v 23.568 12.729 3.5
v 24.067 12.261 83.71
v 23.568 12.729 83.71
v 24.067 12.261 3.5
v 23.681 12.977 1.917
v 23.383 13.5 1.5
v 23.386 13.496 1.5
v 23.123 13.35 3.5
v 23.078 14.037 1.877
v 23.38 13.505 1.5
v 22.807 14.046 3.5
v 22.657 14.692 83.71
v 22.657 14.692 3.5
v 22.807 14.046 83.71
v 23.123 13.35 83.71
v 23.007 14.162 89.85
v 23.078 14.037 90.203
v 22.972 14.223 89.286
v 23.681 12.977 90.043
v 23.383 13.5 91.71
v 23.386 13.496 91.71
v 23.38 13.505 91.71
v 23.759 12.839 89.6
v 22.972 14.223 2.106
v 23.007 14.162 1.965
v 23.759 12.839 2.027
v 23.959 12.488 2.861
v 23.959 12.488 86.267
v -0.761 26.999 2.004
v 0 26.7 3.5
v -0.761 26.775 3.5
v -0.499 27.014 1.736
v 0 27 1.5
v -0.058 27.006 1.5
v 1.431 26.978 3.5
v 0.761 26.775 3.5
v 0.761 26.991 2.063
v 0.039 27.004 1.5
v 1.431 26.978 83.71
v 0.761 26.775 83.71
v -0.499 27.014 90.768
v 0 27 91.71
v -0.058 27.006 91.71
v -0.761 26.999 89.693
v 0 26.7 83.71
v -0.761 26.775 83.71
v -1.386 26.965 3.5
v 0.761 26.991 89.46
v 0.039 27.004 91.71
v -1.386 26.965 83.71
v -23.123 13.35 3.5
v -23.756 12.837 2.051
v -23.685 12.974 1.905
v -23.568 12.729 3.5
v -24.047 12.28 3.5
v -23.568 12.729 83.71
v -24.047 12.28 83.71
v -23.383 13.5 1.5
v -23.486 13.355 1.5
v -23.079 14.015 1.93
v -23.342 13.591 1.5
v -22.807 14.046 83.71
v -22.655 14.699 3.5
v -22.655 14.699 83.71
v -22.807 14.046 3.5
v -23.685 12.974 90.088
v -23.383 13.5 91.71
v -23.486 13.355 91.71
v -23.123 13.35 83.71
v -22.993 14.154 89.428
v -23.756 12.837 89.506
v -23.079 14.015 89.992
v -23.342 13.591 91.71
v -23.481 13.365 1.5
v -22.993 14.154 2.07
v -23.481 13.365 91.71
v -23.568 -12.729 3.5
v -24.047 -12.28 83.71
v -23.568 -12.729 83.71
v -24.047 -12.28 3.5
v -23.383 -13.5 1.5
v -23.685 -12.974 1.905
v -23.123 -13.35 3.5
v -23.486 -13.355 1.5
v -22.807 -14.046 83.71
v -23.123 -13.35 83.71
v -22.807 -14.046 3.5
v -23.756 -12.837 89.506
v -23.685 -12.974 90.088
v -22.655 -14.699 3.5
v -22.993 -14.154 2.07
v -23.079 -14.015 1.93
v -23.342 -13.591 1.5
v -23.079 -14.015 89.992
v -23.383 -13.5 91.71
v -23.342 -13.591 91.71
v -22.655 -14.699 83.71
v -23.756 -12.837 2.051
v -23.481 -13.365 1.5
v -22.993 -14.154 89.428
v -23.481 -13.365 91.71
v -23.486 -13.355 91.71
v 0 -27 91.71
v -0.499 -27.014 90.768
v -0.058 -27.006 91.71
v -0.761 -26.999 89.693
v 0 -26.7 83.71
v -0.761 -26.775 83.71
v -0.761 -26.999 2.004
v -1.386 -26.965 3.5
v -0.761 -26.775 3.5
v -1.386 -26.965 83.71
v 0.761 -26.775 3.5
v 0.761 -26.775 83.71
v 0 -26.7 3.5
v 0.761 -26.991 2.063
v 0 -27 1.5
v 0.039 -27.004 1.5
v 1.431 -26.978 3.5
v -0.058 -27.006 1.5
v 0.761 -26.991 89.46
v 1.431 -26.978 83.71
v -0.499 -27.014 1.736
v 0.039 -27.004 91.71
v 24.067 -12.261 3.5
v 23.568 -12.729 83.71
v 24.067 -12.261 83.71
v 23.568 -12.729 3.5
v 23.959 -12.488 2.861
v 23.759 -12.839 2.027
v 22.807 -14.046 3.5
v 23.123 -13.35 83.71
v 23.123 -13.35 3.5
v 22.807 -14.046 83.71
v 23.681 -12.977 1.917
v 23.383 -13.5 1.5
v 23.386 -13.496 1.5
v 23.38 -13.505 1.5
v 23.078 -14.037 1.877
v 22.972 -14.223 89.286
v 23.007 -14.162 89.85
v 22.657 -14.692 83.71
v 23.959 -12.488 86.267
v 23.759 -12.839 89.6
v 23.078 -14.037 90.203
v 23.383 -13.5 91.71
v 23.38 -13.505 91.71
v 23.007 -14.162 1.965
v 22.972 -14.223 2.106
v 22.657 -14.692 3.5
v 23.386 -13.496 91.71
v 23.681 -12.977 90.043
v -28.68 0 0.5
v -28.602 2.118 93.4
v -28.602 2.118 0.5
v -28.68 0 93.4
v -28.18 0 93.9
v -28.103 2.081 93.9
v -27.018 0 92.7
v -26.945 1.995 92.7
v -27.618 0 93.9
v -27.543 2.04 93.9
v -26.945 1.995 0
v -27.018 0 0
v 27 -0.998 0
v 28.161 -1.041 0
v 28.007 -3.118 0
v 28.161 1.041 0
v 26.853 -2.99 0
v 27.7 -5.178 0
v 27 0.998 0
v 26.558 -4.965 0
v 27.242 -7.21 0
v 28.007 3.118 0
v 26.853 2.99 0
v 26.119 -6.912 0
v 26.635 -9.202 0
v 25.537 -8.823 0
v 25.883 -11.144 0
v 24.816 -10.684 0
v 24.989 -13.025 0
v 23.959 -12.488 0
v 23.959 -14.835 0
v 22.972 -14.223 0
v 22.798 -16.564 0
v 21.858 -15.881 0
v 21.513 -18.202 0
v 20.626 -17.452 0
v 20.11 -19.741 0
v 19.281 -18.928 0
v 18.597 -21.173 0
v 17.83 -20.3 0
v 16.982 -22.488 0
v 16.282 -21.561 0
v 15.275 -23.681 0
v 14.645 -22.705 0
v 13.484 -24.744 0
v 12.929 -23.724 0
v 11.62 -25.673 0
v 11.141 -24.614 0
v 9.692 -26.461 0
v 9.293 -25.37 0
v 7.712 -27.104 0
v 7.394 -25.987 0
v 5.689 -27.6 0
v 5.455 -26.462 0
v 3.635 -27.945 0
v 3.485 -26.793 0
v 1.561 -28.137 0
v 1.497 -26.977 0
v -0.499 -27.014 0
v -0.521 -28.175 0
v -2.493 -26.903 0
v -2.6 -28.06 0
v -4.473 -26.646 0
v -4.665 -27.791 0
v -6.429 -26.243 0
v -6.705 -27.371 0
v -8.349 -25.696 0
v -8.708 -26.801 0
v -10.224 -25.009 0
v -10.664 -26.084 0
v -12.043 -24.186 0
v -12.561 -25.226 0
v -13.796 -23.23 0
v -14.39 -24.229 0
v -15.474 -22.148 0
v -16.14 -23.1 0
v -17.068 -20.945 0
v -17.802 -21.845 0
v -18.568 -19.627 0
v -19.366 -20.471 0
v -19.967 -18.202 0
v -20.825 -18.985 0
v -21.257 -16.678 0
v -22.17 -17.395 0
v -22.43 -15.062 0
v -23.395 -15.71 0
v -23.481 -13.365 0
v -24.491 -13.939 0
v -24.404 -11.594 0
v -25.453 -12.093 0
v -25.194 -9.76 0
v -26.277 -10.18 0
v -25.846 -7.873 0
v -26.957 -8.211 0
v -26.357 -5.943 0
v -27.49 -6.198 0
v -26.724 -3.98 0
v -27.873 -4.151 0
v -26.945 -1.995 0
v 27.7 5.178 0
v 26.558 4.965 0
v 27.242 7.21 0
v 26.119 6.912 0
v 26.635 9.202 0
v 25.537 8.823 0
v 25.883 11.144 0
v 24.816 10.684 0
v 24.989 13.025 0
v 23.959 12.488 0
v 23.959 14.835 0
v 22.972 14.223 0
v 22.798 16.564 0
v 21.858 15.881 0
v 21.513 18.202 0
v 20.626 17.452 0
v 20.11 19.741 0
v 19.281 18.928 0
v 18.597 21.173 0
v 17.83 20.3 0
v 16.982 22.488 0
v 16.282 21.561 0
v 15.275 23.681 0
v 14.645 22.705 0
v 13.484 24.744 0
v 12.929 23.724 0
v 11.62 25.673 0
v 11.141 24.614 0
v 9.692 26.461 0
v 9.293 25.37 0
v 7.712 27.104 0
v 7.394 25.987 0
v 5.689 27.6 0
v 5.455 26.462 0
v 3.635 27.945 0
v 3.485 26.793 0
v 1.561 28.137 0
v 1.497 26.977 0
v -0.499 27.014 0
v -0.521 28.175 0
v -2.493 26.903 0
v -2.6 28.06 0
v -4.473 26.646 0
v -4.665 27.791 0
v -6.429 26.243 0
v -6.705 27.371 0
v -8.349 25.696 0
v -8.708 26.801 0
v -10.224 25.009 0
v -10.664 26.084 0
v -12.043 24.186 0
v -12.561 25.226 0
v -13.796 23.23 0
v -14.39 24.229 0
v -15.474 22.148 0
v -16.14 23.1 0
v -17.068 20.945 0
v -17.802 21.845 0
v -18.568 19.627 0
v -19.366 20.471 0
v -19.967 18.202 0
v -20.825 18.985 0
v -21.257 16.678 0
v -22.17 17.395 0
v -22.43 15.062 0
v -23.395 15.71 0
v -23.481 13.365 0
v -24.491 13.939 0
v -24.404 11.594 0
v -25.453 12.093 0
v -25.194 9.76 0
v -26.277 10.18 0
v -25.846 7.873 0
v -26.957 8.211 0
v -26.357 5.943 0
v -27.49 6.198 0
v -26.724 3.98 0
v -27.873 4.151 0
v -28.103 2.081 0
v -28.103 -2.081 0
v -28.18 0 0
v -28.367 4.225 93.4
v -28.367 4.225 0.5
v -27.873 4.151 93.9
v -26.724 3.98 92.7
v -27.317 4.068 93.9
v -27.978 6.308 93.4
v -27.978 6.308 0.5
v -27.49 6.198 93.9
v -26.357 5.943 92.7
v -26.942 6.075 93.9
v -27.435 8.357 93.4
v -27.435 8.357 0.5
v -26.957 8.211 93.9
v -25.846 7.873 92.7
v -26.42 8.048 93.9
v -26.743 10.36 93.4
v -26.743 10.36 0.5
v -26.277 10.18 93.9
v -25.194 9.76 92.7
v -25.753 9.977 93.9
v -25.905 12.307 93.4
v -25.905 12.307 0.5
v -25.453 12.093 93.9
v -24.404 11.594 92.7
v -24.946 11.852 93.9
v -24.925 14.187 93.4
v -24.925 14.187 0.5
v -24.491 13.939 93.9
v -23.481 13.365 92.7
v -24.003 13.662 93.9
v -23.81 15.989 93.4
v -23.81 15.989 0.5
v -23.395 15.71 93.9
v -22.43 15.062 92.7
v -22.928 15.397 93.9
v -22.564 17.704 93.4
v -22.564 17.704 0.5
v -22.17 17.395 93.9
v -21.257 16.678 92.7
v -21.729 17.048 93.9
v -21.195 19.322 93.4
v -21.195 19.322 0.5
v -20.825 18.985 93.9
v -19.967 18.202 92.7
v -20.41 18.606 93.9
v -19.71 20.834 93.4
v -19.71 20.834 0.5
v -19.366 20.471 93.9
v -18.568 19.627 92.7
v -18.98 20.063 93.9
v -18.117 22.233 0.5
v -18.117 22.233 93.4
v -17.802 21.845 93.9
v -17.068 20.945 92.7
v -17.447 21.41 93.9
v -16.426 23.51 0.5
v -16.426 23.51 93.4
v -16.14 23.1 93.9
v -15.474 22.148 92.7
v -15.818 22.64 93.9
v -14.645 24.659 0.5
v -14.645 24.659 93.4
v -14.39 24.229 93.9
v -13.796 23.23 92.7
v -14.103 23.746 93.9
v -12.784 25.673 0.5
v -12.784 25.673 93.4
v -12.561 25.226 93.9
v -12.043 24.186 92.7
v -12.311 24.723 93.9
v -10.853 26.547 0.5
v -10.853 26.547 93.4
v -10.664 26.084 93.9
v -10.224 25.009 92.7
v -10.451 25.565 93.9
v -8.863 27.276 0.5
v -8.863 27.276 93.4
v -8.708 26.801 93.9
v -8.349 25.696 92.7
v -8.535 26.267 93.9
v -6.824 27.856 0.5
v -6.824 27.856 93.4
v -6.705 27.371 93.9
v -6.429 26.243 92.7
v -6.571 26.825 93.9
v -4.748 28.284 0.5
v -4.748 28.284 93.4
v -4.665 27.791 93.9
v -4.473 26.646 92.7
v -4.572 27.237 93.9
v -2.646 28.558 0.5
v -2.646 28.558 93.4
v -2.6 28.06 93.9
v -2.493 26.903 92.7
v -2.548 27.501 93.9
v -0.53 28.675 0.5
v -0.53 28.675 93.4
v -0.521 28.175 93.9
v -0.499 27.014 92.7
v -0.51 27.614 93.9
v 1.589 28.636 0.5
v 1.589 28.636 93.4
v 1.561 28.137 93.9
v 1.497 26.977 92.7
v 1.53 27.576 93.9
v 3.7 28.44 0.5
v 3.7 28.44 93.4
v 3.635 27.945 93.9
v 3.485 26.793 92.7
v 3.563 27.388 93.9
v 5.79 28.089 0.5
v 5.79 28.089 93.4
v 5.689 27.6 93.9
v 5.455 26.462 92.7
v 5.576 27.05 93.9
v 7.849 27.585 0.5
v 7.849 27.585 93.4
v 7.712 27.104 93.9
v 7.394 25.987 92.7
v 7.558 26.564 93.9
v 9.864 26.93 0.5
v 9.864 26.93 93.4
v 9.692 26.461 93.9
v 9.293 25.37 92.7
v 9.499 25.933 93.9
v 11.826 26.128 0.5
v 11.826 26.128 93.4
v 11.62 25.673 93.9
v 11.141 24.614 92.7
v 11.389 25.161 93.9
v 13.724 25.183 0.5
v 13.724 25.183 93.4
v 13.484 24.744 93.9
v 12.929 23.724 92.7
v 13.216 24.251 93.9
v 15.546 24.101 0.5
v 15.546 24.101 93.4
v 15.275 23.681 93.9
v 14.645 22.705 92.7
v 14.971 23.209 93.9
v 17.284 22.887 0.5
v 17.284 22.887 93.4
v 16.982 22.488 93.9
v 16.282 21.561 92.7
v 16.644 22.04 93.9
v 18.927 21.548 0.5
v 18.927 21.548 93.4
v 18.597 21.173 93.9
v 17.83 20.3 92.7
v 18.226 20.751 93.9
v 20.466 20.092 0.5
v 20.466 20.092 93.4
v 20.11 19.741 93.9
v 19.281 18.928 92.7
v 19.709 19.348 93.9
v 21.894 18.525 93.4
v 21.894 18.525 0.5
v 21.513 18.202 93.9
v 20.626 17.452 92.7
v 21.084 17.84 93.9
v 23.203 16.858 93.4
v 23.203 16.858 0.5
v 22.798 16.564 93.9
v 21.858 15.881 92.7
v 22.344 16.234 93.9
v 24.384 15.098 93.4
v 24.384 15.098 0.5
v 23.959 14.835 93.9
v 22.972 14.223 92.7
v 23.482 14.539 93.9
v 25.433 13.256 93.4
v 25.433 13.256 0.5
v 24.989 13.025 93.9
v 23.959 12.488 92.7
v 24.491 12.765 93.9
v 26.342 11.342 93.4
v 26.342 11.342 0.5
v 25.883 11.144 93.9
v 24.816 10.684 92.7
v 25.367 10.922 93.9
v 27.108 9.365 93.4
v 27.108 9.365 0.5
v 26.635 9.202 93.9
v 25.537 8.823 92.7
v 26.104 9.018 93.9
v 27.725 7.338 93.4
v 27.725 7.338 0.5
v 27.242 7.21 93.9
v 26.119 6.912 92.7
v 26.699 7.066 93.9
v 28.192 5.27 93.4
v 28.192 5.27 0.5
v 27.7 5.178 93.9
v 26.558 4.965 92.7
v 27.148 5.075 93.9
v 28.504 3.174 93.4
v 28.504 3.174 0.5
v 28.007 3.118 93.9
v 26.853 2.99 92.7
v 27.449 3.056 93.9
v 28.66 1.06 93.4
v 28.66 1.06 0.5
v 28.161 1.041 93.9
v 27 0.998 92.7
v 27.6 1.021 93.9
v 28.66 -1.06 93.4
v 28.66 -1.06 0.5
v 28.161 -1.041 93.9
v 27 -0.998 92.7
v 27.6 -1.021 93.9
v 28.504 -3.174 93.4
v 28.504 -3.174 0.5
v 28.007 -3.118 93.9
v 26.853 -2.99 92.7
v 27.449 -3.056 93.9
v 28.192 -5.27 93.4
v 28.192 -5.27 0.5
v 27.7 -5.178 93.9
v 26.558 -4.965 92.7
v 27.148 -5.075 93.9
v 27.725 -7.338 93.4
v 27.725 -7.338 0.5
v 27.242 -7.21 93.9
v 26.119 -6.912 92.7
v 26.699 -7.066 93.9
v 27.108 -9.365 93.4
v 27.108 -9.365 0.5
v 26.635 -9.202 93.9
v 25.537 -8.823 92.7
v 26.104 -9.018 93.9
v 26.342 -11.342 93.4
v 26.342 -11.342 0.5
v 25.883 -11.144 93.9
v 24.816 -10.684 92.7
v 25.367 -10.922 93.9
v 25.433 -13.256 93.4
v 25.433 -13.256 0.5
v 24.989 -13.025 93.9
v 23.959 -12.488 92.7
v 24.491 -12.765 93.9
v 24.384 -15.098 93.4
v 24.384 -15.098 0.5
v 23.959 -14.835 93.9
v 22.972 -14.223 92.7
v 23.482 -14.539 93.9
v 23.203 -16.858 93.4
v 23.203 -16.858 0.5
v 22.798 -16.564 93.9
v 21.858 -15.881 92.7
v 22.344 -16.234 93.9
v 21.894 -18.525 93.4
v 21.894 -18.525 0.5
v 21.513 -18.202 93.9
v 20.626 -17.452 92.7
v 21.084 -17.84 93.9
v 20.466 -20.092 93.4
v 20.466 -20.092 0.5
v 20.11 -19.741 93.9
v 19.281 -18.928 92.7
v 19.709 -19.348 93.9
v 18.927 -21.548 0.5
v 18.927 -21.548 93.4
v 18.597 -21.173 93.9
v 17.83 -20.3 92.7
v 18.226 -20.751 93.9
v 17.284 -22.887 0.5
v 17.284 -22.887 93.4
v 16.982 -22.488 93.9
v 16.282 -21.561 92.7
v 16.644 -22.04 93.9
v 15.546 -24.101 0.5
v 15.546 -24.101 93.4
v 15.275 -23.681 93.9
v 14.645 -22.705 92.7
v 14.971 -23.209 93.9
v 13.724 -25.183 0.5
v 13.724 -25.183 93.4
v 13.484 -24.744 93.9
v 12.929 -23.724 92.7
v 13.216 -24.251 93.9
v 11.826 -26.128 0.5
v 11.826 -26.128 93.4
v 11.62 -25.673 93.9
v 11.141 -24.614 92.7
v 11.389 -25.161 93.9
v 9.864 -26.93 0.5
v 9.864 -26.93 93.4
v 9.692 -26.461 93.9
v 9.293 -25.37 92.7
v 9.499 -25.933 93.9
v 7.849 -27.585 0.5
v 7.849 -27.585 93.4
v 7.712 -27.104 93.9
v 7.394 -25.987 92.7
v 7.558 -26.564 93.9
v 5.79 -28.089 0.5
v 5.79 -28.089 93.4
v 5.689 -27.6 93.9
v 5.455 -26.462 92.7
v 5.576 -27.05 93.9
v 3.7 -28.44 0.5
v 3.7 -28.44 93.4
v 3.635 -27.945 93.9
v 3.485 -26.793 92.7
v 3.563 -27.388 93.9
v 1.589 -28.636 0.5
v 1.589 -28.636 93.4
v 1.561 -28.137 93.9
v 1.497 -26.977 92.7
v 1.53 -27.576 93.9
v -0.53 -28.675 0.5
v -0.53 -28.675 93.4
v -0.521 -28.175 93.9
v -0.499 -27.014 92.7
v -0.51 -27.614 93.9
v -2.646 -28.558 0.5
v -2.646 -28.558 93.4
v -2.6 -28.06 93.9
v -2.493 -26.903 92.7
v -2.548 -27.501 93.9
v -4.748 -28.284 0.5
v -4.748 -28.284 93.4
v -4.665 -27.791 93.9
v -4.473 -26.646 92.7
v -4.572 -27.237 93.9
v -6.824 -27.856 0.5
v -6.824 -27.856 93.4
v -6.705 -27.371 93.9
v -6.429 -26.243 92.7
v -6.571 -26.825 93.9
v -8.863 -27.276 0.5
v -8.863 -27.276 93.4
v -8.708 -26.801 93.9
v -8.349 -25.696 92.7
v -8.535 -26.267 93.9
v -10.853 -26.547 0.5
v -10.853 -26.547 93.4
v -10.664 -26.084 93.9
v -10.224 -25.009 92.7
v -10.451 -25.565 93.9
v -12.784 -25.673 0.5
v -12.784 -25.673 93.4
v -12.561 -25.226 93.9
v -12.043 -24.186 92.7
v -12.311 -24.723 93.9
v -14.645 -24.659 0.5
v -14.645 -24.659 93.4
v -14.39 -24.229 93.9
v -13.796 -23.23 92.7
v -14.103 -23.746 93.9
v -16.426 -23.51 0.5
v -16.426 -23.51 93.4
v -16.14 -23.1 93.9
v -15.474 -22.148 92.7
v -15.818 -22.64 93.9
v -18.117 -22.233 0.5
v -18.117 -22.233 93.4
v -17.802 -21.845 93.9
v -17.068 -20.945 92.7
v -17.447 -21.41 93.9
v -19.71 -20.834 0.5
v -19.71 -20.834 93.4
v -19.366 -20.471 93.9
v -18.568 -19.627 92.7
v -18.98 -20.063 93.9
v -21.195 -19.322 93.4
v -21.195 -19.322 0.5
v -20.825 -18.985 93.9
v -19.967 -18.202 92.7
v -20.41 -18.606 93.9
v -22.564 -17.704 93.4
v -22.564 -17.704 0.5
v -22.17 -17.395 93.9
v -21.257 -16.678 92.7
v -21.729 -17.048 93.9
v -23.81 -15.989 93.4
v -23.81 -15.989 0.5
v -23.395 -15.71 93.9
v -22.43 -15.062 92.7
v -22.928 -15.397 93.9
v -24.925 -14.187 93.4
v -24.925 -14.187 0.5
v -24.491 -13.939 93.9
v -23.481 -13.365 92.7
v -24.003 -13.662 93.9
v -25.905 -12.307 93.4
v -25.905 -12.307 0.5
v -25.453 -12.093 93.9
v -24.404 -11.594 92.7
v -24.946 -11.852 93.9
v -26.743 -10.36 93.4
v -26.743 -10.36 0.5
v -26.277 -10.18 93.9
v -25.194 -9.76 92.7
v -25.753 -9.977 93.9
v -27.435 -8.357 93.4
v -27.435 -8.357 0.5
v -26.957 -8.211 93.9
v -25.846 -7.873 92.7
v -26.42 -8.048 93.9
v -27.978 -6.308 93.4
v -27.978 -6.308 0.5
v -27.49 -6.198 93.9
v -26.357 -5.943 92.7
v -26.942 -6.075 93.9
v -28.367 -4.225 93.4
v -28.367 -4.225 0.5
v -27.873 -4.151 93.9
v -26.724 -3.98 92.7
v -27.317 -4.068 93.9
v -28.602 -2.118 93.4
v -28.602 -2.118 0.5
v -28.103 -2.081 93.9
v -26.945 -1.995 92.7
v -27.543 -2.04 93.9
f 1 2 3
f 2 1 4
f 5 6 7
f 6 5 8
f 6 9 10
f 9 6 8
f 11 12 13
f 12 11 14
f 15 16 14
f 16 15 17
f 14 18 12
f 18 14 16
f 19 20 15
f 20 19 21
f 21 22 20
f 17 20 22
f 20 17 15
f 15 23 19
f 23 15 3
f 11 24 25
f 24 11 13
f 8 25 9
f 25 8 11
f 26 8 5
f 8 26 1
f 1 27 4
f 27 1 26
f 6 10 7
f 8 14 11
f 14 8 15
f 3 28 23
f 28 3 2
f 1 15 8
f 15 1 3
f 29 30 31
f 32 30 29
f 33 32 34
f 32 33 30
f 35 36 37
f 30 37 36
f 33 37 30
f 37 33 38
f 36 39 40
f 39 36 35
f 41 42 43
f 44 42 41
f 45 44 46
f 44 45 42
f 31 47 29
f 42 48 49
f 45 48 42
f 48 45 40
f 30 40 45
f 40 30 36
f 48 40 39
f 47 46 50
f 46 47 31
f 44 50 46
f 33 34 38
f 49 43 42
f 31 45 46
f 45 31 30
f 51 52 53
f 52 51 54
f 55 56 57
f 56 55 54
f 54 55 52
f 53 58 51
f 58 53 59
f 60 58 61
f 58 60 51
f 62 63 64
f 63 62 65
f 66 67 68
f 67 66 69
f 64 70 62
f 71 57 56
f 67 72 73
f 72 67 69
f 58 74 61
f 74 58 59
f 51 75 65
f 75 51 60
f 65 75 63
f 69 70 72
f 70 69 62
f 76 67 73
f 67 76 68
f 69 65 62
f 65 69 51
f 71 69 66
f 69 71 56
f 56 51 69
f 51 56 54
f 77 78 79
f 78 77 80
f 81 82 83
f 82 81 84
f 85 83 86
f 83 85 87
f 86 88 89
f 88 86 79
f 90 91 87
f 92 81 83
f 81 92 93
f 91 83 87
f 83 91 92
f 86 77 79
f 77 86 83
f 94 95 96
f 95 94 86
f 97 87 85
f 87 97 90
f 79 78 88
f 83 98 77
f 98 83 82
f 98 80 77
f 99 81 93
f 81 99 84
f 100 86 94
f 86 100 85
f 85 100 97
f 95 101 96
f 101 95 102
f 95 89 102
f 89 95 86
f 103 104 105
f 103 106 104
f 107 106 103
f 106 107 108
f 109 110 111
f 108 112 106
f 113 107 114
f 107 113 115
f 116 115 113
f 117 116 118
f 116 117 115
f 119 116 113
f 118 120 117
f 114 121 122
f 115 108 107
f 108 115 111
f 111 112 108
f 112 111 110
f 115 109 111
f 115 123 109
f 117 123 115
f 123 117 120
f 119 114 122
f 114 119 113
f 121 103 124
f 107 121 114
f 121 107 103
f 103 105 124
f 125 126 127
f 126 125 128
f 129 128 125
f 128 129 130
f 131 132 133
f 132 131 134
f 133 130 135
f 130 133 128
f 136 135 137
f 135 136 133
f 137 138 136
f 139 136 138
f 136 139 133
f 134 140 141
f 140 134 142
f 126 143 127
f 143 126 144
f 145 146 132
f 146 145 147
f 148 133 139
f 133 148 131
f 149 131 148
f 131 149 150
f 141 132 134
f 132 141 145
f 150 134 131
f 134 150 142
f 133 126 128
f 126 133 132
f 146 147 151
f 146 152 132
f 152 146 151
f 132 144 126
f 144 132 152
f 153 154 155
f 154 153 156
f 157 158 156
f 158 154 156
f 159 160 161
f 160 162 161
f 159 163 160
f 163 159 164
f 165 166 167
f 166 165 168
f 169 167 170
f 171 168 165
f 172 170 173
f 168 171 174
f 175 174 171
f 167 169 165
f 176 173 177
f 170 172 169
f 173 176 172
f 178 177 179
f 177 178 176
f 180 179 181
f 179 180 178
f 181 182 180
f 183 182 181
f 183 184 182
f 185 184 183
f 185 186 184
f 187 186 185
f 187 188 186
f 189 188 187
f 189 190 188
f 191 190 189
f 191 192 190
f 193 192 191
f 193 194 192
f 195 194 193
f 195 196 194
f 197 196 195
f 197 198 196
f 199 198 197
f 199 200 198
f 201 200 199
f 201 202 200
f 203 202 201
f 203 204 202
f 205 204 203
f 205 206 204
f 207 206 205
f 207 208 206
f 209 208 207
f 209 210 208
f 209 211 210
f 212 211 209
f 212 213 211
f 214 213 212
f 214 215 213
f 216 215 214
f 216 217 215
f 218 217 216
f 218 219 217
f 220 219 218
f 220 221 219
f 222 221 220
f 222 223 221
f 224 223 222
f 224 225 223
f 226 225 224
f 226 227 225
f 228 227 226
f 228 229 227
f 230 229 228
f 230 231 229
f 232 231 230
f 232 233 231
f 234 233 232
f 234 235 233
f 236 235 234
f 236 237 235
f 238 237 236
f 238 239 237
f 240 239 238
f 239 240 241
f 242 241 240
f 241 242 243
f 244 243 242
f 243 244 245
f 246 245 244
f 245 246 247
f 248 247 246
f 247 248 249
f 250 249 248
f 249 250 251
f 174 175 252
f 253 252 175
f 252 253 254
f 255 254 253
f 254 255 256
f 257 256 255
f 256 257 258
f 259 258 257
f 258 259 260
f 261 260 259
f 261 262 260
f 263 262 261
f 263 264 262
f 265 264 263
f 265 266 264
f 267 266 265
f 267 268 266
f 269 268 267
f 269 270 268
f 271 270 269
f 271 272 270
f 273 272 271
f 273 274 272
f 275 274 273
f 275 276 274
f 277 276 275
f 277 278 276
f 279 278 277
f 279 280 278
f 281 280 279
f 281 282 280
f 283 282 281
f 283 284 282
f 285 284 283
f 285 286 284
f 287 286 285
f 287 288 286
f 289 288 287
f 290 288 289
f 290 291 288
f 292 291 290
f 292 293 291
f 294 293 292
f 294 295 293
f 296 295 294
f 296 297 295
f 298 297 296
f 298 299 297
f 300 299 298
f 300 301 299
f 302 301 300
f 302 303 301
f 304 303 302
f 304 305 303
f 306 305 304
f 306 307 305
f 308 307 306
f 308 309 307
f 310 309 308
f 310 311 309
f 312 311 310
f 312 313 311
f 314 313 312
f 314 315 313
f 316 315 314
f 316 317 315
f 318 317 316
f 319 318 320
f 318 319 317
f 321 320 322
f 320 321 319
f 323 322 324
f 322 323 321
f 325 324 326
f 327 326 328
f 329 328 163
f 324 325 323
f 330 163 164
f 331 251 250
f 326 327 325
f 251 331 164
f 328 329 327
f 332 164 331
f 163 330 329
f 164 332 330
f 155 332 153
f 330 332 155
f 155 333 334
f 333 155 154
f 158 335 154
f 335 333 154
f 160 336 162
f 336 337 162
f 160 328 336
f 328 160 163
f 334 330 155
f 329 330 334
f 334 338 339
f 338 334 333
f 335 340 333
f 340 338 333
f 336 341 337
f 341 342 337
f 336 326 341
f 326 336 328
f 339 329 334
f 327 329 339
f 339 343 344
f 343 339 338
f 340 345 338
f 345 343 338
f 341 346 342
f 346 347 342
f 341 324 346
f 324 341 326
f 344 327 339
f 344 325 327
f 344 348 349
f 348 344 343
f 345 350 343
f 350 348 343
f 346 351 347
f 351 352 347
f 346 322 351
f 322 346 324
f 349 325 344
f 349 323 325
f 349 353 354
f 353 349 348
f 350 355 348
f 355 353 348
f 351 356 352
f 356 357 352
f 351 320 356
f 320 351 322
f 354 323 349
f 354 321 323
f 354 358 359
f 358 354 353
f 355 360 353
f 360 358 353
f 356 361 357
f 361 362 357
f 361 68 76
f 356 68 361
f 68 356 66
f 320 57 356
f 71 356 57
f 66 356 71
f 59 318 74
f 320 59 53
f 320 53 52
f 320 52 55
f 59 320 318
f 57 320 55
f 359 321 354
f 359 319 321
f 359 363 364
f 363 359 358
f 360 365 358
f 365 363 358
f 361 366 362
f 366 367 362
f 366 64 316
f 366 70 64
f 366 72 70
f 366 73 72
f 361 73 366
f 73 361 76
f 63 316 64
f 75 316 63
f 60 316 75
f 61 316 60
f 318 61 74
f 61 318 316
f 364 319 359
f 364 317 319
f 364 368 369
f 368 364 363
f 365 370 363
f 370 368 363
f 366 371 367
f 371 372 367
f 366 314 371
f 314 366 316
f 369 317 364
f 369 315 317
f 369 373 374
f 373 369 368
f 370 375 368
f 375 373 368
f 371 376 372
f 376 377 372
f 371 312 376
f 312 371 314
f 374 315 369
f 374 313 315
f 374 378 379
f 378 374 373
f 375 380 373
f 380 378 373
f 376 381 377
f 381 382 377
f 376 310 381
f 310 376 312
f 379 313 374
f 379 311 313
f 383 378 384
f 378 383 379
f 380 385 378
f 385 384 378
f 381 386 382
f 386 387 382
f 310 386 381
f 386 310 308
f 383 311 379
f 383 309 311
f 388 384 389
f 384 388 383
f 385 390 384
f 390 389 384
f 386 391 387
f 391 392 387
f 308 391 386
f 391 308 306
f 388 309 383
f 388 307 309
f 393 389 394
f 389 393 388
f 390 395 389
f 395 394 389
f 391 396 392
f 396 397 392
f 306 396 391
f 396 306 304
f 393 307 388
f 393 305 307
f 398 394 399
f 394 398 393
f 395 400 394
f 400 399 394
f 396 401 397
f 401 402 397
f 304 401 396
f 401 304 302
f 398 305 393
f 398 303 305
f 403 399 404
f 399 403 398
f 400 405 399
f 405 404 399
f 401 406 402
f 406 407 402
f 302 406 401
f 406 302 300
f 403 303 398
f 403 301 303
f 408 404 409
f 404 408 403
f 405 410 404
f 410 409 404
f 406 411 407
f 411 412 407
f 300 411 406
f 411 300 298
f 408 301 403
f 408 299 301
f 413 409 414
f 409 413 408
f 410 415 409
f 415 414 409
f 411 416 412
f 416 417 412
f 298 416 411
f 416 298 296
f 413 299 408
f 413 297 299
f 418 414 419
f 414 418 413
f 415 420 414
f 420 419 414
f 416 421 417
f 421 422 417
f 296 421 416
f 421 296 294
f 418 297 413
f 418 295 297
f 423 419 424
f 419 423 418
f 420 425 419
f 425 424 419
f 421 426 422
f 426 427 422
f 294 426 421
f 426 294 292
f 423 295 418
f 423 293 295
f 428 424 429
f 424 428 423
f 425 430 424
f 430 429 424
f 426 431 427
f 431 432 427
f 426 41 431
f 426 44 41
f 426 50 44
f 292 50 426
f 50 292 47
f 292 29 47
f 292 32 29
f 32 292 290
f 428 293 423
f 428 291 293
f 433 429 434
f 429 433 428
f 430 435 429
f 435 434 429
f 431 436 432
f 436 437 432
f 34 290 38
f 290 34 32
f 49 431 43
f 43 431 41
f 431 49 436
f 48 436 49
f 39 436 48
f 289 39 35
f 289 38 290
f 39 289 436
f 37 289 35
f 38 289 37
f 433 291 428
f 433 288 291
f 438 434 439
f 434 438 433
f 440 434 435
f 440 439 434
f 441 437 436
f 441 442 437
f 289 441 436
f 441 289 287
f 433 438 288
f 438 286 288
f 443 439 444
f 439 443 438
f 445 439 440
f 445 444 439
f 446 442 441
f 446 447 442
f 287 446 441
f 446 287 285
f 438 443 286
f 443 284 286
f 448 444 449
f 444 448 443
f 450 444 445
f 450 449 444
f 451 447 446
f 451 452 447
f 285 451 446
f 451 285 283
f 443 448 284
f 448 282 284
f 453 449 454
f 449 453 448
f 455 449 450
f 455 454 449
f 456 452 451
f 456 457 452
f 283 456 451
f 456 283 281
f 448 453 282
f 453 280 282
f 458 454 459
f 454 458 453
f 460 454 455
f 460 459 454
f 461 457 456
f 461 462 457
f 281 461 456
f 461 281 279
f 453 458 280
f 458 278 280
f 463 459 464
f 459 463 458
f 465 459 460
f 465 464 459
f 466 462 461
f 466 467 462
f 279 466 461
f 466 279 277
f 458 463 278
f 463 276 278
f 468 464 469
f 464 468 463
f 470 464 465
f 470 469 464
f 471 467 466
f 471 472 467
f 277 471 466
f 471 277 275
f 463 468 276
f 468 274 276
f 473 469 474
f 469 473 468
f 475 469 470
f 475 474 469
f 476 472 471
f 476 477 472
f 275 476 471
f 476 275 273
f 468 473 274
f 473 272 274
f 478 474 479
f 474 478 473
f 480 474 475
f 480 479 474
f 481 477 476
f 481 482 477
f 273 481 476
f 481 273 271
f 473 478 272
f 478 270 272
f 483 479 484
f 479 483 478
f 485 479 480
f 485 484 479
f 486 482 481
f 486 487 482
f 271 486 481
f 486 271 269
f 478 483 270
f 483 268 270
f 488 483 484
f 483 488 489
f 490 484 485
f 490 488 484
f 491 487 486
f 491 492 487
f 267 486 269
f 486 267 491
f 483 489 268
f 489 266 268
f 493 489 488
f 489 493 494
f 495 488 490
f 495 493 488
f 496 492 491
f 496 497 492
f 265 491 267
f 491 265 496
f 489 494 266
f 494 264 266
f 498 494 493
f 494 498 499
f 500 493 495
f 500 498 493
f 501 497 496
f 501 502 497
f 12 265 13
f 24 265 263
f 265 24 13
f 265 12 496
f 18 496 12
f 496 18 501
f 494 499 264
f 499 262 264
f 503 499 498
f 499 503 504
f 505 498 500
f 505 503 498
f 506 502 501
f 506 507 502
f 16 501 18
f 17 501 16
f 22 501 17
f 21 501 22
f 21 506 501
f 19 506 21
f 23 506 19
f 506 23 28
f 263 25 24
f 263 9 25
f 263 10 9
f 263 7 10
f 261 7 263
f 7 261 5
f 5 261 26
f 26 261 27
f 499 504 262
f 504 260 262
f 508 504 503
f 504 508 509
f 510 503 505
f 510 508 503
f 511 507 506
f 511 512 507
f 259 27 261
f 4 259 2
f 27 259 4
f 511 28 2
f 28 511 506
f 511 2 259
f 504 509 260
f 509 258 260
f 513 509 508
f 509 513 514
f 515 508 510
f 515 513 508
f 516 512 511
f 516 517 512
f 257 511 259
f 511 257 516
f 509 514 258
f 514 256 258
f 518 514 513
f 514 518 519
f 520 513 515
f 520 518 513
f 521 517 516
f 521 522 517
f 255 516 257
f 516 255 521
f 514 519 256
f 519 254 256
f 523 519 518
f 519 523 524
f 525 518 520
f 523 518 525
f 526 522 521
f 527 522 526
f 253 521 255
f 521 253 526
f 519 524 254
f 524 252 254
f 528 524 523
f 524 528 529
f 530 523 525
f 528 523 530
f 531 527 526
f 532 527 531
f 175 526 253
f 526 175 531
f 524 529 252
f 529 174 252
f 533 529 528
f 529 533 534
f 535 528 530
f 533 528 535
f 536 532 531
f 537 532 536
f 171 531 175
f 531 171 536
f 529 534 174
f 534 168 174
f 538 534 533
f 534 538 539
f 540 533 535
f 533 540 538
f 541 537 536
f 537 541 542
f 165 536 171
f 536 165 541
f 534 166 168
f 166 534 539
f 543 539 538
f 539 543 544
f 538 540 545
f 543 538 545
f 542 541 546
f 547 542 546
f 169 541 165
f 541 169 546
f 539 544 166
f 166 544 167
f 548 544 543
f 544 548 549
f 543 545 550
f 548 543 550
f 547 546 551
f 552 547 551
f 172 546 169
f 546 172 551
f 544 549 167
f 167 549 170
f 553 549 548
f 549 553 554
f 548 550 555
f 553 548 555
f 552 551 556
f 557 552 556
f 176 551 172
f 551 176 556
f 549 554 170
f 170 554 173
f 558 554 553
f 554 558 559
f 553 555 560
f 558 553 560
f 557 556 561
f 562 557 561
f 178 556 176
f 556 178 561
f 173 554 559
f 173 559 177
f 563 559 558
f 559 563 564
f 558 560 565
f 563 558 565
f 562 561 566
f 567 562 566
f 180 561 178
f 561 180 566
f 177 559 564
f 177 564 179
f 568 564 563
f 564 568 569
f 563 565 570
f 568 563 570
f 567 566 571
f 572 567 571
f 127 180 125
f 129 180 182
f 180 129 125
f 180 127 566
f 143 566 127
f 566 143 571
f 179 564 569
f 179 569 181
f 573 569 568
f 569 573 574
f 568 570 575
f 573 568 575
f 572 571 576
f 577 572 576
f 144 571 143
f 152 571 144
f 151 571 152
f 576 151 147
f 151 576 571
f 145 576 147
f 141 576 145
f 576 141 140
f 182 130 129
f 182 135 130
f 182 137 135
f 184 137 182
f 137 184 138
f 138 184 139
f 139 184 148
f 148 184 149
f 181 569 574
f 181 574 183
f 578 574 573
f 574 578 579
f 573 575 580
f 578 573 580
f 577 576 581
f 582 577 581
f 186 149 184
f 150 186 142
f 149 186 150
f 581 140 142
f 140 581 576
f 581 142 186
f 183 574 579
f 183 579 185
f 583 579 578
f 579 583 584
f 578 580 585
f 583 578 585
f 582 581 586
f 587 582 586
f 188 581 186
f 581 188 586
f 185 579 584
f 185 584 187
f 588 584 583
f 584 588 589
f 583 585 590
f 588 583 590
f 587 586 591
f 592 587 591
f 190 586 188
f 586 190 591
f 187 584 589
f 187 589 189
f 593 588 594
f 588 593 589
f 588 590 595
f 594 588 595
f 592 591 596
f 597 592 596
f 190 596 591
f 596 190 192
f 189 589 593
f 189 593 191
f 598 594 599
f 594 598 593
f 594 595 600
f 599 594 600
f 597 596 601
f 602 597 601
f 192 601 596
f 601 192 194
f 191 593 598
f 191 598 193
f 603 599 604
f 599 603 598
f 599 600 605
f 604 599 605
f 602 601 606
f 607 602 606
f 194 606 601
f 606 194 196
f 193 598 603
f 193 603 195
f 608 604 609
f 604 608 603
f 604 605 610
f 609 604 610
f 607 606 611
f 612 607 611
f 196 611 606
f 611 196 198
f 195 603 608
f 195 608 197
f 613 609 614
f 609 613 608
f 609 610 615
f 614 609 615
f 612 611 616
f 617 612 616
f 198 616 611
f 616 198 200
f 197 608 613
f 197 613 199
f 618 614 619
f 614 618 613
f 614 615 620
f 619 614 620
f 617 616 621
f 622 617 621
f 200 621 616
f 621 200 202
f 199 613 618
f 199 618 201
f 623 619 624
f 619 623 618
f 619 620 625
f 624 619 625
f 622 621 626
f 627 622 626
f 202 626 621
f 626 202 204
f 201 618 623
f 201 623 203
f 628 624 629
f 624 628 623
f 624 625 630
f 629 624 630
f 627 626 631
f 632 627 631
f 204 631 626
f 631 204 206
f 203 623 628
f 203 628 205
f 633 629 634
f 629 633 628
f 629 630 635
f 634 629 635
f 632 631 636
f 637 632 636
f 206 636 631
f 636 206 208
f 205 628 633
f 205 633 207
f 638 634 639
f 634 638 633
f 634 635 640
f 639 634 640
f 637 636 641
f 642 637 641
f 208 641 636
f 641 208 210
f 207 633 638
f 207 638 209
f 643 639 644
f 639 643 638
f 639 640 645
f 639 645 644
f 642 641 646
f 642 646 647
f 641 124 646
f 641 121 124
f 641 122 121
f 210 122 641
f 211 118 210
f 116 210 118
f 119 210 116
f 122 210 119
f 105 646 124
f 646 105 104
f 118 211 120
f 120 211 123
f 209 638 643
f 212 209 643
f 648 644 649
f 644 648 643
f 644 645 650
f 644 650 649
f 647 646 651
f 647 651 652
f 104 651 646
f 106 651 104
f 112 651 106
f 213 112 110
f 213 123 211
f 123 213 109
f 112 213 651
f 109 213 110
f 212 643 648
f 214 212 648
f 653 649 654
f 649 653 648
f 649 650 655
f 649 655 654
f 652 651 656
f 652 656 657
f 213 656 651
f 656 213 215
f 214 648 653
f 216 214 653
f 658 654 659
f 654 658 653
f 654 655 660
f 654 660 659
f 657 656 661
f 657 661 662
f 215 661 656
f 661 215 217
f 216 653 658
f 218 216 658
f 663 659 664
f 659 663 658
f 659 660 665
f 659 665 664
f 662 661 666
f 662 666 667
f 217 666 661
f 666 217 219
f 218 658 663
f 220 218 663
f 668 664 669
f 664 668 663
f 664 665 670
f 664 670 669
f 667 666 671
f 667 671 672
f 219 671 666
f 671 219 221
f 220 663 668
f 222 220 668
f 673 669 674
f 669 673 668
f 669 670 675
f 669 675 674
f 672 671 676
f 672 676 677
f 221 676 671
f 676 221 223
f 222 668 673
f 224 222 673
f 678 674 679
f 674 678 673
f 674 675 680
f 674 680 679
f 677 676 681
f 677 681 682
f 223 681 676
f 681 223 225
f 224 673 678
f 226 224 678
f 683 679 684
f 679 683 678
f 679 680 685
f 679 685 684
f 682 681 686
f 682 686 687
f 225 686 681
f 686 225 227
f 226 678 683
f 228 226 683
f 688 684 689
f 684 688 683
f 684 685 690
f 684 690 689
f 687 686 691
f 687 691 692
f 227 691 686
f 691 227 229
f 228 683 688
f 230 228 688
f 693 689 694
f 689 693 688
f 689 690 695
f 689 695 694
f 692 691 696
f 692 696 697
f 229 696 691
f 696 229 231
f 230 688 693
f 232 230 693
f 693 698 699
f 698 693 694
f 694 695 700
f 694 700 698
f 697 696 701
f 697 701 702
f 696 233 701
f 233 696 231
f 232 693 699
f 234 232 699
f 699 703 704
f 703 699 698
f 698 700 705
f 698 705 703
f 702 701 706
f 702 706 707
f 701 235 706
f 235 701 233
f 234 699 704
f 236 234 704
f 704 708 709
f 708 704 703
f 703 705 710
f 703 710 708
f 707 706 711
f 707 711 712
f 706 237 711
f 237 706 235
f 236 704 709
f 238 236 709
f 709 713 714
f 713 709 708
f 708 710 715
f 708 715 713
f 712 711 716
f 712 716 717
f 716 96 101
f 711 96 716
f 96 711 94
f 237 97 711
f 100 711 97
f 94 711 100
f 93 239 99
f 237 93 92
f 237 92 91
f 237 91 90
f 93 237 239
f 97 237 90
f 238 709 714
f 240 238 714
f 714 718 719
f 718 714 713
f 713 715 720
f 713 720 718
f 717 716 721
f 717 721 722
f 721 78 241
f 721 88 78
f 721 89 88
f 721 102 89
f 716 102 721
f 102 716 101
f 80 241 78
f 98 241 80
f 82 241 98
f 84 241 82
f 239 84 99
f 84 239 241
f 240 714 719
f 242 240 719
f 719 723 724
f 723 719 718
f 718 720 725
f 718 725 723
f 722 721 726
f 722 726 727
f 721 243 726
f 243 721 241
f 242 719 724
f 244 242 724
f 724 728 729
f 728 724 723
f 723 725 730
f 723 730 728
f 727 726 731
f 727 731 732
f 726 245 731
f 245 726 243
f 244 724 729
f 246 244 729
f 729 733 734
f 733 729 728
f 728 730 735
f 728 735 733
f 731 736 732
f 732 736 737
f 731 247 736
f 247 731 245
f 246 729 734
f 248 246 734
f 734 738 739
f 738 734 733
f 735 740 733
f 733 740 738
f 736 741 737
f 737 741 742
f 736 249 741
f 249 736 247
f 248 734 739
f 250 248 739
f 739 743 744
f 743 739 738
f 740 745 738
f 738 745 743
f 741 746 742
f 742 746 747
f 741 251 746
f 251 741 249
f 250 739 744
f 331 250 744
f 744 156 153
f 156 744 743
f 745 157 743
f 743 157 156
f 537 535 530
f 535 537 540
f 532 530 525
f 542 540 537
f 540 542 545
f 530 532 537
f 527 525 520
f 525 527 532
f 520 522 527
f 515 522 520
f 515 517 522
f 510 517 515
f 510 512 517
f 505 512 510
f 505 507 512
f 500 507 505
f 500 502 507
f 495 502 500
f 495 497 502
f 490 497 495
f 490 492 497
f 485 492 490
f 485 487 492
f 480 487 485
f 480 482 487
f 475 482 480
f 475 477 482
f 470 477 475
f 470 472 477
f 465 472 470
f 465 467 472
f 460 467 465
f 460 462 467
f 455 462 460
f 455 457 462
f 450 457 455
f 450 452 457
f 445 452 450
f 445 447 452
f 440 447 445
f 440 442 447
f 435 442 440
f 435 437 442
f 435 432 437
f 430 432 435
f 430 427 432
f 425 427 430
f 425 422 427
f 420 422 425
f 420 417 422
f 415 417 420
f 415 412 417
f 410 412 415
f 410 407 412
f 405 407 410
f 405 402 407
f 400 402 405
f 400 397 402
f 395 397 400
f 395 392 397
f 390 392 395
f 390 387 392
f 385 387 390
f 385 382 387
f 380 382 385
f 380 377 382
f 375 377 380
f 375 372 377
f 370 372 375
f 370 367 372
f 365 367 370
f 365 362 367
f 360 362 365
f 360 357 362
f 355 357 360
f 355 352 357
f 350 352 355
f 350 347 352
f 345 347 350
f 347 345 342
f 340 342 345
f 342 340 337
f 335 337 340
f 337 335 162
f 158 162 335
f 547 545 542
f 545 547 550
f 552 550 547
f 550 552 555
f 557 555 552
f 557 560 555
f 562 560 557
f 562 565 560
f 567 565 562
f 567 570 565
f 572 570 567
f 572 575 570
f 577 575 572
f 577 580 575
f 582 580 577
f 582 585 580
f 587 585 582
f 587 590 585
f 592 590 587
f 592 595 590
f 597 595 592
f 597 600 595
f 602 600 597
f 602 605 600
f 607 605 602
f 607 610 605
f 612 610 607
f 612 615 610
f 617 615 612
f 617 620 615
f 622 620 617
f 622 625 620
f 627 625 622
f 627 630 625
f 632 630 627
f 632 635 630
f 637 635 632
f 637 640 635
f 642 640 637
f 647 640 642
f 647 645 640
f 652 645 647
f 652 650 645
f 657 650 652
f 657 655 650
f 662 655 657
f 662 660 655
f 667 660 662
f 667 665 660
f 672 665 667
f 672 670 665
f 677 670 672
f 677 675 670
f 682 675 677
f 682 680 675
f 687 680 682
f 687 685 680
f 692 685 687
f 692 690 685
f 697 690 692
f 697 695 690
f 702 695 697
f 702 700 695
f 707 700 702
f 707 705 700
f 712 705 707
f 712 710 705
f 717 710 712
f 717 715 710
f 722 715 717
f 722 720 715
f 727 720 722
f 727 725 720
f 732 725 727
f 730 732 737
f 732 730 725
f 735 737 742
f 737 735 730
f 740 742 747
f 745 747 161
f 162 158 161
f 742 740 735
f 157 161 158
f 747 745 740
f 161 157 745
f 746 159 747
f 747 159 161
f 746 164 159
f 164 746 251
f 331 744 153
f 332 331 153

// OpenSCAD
// Sleeve — drops into the fish koozie and holds a 250 ml / 8.3 oz slim can
// instead of the 12 oz one.
//
// The fish-koozie cousin of slim-can-adapter-ring-12oz-to-8-3oz.scad, and
// the same sleeve: Ø54.00 bore with six grip ribs for the 250 ml can, a 1.68
// wall, Ø57.36 outside, which goes into the fish's Ø58.40 bore past its six
// ribs exactly as a 12 oz can does. The fish's bore is the holders' bore to
// the last digit — same recipe, same ribs, same 0.23 of pull-in assumed — so
// every number in [Can], [Host] and [Grip ribs] is lifted from that ring and
// none of them is a decision made here.
//
// WHAT IS DIFFERENT IS THE TOP, AND THERE ISN'T ONE. The holders have a flat
// Ø76.20 rim for a lip to sit on and be lifted by. The fish has a mouth. Its
// Ø58.40 bore is cut straight up through both jaws to the tips of the lips,
// so above the bore's top (z 86.0 on the fish, lead-in to 86.6) there is no
// rim, no ledge and no room: the mouth is the bore, continued, with the jaws
// standing 105 to 117 mm up on two sides and the corners of the mouth down
// at 89 and 92–98 on the other two. Measured on the built mesh of
// fish-koozie-12oz v02, in 30-degree sectors from +x: 97.5, 110.1, 116.9,
// 116.8, 109.9, 98.3, 89.3, 104.6, 111.9, 111.9, 105.5, 91.9. A lip cannot
// go anywhere in that.
//
// So there is no lip, and the sleeve works the other way round from the
// ring: it stands on the fish's floor instead of hanging off a rim, and it
// is tall enough to come up through the mouth and stand proud of the low
// corner by 10 mm. That exposed arc of rim, 15–25 mm of it, is what a thumb
// inside and a finger outside pinch to pull the sleeve out — after the can,
// which stands 40 mm above it anyway. The bottom is open, like the ring's,
// so the can sits on the fish's own floor and the fish's drain still pushes
// it out from underneath. Nothing sets the depth but the floor, which is
// flat and on the axis; a lip seated on the fish's skewed lead-in would have
// sat crooked.
//
// THE WALL IS ONE RUNG, for the ring's reason: between a Ø54.00 bore and an
// outside that has to pass the fish's ribs there is 1.68 of wall and no more.
// The slicing reference's four-loop figure is 1.74; 1.68 is what the ring is
// drawn at and the two should be printed and judged together.
//
// ORIENTATION. Drawn as used and PRINTED THE SAME WAY, open bottom on the
// bed: there is no lip to turn it over for, and printed this way up the
// first layer is the base with its 0.50 chamfer and a square inside edge,
// 1.18 wide, where the rim end would put a 0.4 mm ring on the plate. Going
// up, the rib feet grow inward at 8 degrees, the rib ramps and the base
// chamfer narrow, and the mouth lead-in at the top opens the bore outward,
// all of which the printer sees as nothing. The rim's outside chamfer
// narrows going up too. A 94 mm tube on a 1.2 mm ring is tall for its foot;
// if it lets go of the plate, a brim is the slicer's answer, not a wider
// foot that would not pass the ribs.
//
// ⚠️ THE ONE THING NOT PROVEN is how an outside diameter prints on this
// machine — the same gap the ring has, and neither has been printed yet.
// The coupon is the bottom 20 mm of the sleeve, printed exactly as the
// sleeve prints, so the base chamfer is on the bed and the cut face is at
// the top where there is no elephant foot to fake a tight reading. It tests
// the sleeve in the fish and a can in the sleeve at once.
//
// The coupon is the only thing here a plate can answer, and there is one
// variant for it, so the plate and the component are the same. Keep the
// names stable — utils/coupon.sh reads these and knows nothing about the part.
//
// COUPON-COMPONENTS: fit=coupon
// COUPON-PLATE: coupon

/* [Output] */

// "cut" is a half-section for reading the wall, the chamfers and the ribs.
// Not for printing. "coupon" is the fit test; see [Fit coupon].
show = "part";   // [part, cut, coupon]

$fa = 4;   // organic faceting per the 0.4-nozzle rule; no global high $fn
$fs = 0.4;
eps = 0.01;

/* [Can] */

// Body diameter of a 250 ml / 8.3 oz slim can (mm). Red Bull's sleek can, and
// the number slim-can-holder-8-3oz.scad is cut to.
can_d = 53.0;
// Clearance on diameter at the bore itself (mm). The ribs, not this, set the
// grip — this only has to let the can pass.
can_slop = 0.40;
// Extra diameter added to the bore to cover this machine's bore shrinkage (mm).
// Settled 2026-08-22 on the 250 ml holder's fit coupon and carried here
// unchanged, as the ring carries it. ⚠️ Do NOT "correct" this to the measured
// 0.23: it and rib_h are a matched pair.
bore_comp = 0.60;

/* [Host — the fish this drops into] */

// Read off parts/fish-koozie-12oz.scad and its built mesh. Change them only
// if the fish changes; nothing here is a choice.

// The fish's bore as drawn (mm): can 57.40 + slop 0.40 + comp 0.60.
host_bore_d = 58.40;
// What this machine takes out of a bore that size (mm on diameter), measured
// on the Ø54 bore and carried by the holders' own argument that the loss is
// absolute, not proportional.
host_bore_loss = 0.23;
// How far the fish's grip ribs stand into its bore (mm).
host_rib_h = 0.30;
// Top of the fish's floor (mm above its bed): floor_t. The sleeve stands on it.
host_floor_z = 5.40;
// Top of the fish's bore (mm), where the lead-in starts opening: bore_top.
host_bore_top_z = 86.03;
// The lowest point of the mouth's rim at the bore (mm above the fish's bed):
// the corner of the mouth at 180–210 degrees, measured on the built mesh.
// The sleeve's rim stands proud of this.
host_mouth_low_z = 89.3;
// Drain through the fish's floor (mm), on the axis. The sleeve's bottom ring
// has to clear it.
host_drain_d = 12.0;

/* [Sleeve] */

// Wall between the can and the fish (mm). 1.68 is 4 walls at 0.42; see THE
// WALL IS ONE RUNG in the header.
wall_w = 1.68;
// How far the rim stands above the lowest corner of the fish's mouth (mm).
// It is the handle: enough to get a thumb and a finger on.
proud = 10.0;
// 45-degree chamfer on the outside of the bottom edge (mm). On the bed, so
// it is the elephant-foot chamfer — the reference's PETG minimum — and the
// lead-in past the fish's ribs on the way down.
base_cham = 0.50;
// 45-degree chamfer on the outside of the rim (mm). Narrows going up.
rim_cham = 0.50;
// Lead-in at the mouth, for the can (mm): how far out on radius, and over
// what height. Small, because the wall has 1.68 to share between this and
// the rim chamfer and the rim still has to have a top.
mouth_cham_r = 0.60;
mouth_cham_h = 1.20;

/* [Grip ribs] */

// Rounded vertical ribs in the bore. The 250 ml holder's six, unchanged.
rib_count = 6;
rib_h     = 0.30;   // how far each rib stands into the bore (mm)
rib_w     = 3.00;   // chord width of the bump (mm)
rib_ramp  = 8.0;    // lead-in at the top, over which the rib fades to nothing (mm)
rib_foot  = 2.0;    // the same at the bottom, where the printer sees it as an overhang (mm)

/* [Fit coupon] */

// Height of the coupon (mm): the bottom of the sleeve, base chamfer and rib
// feet included, printed the same way up as the sleeve. 20 is the 2 mm foot
// and 16.5 mm of full-proud rib.
coupon_h = 20.00;

/* [Quality] */

// Chord error target (mm). 0.02 is the 0.4-nozzle figure.
chord_err = 0.02;

/* [Hidden] */

// Facets for a target chord error on a given radius.
function facets(r, e = chord_err) = ceil(180 / acos(1 - e / r));
// Radius that makes the INSCRIBED polygon's inner radius equal r.
function r_hole(r, n) = r / cos(180 / n);

bore_d    = can_d + can_slop + bore_comp;
bore_r    = bore_d / 2;
sleeve_od = bore_d + 2 * wall_w;
sleeve_r  = sleeve_od / 2;

rim_z     = host_mouth_low_z + proud;      // the rim, on the fish's scale
total_h   = rim_z - host_floor_z;          // floor to rim

nseg      = facets(sleeve_r);
r_bore    = r_hole(bore_r, nseg);

// What the sleeve faces in the fish, printed, and what it leaves.
host_across_ribs = host_bore_d - host_bore_loss - 2 * host_rib_h;
host_clear       = host_across_ribs - sleeve_od;

rib_r    = rib_h > 0 ? (rib_w * rib_w / 4 + rib_h * rib_h) / (2 * rib_h) : 0;
rib_ax   = bore_r + rib_r - rib_h;
rib_z0   = base_cham + 1.0;
rib_z1   = total_h - mouth_cham_h - 1.0;

assert(sleeve_od < host_bore_d - 2 * host_rib_h,
       str("the sleeve is fatter than the fish's ribs will pass: ",
           sleeve_od, " against ", host_bore_d - 2 * host_rib_h));
assert(wall_w >= 1.26,
       "the wall is under 3 lines at 0.42: raise wall_w");
assert(bore_r + mouth_cham_r < sleeve_r - rim_cham,
       "the mouth lead-in has run into the rim's chamfer: the rim has no top");
assert(bore_d > host_drain_d + 2,
       "the sleeve's bottom ring sits over the fish's drain");
assert(rim_z > host_bore_top_z + 5,
       "the rim is inside the fish's bore: raise proud");
assert(rib_z1 - rib_ramp > rib_z0 + rib_foot,
       "the rib ramp and foot overlap: the sleeve is too short for them");
assert(coupon_h > rib_z0 + rib_foot + 5,
       "the coupon is too short to reach full-proud rib");

// Solid section, before the bore is cut. Bottom inner corner first, running
// counter-clockwise: bottom, base chamfer, outside, rim chamfer, top, mouth
// lead-in, bore.
module sleeve_solid() {
    pts = [
        [r_bore,                 0],
        [sleeve_r - base_cham,   0],
        [sleeve_r,               base_cham],
        [sleeve_r,               total_h - rim_cham],
        [sleeve_r - rim_cham,    total_h],
        [r_bore + mouth_cham_r,  total_h],
        [r_bore,                 total_h - mouth_cham_h]
    ];
    rotate_extrude(angle = 360, $fn = nseg) polygon(pts);
}

module ribs() {
    n = facets(rib_r);
    for (i = [0 : rib_count - 1])
        // Half a pitch off the x axis, so the cut view at y = 0 shows the bore
        // and not a rib edge-on.
        rotate([0, 0, 30 + i * 360 / rib_count])
            hull() {
                translate([bore_r + rib_r, 0, rib_z0])
                    cylinder(r = rib_r, h = eps, $fn = n);
                translate([rib_ax, 0, rib_z0 + rib_foot])
                    cylinder(r = rib_r, h = eps, $fn = n);
                translate([rib_ax, 0, rib_z1 - rib_ramp])
                    cylinder(r = rib_r, h = eps, $fn = n);
                translate([bore_r + rib_r, 0, rib_z1])
                    cylinder(r = rib_r, h = eps, $fn = n);
            }
}

// Each rib is a 3.90 mm arc of which 0.30 is wanted, so left alone it would
// poke out through a 1.68 mm wall. It is clipped to a cylinder inside the
// sleeve's outer face before it goes in — inside, not at it, so no face of
// the clip is coincident with the sleeve.
module sleeve() {
    union() {
        sleeve_solid();
        if (rib_count > 0 && rib_h > 0)
            intersection() {
                ribs();
                cylinder(r = sleeve_r - 0.20, h = total_h, $fn = nseg);
            }
    }
}

// The fit coupon: the bottom coupon_h of the sleeve, as it is.
module fit_coupon() {
    intersection() {
        sleeve();
        translate([-sleeve_od, -sleeve_od, -eps])
            cube([2 * sleeve_od, 2 * sleeve_od, coupon_h + eps]);
    }
}

echo(str("sleeve: outside ", sleeve_od, "  bore ", bore_d,
         "  across ribs ", bore_d - 2 * rib_h, "  wall ", wall_w,
         "  ", total_h, " tall, floor at ", host_floor_z,
         " to rim at ", rim_z, " on the fish"));
echo(str("in the fish: faces ", host_across_ribs,
         " across its printed ribs, clearance ", host_clear,
         " on diameter; rim stands ", proud,
         " above the low corner of the mouth and ",
         rim_z - host_bore_top_z, " above the bore's top"));
echo(str("on the can: printed bore ", bore_d - host_bore_loss,
         ", across ribs ", bore_d - host_bore_loss - 2 * rib_h,
         ", clearance ", bore_d - host_bore_loss - 2 * rib_h - can_d,
         " on a ", can_d, " can"));

if (show == "coupon")
    fit_coupon();
else if (show == "cut")
    difference() {
        sleeve();
        translate([-sleeve_od, -sleeve_od, -eps])
            cube([2 * sleeve_od, sleeve_od, total_h + 1]);
    }
else if (show == "part")
    sleeve();
